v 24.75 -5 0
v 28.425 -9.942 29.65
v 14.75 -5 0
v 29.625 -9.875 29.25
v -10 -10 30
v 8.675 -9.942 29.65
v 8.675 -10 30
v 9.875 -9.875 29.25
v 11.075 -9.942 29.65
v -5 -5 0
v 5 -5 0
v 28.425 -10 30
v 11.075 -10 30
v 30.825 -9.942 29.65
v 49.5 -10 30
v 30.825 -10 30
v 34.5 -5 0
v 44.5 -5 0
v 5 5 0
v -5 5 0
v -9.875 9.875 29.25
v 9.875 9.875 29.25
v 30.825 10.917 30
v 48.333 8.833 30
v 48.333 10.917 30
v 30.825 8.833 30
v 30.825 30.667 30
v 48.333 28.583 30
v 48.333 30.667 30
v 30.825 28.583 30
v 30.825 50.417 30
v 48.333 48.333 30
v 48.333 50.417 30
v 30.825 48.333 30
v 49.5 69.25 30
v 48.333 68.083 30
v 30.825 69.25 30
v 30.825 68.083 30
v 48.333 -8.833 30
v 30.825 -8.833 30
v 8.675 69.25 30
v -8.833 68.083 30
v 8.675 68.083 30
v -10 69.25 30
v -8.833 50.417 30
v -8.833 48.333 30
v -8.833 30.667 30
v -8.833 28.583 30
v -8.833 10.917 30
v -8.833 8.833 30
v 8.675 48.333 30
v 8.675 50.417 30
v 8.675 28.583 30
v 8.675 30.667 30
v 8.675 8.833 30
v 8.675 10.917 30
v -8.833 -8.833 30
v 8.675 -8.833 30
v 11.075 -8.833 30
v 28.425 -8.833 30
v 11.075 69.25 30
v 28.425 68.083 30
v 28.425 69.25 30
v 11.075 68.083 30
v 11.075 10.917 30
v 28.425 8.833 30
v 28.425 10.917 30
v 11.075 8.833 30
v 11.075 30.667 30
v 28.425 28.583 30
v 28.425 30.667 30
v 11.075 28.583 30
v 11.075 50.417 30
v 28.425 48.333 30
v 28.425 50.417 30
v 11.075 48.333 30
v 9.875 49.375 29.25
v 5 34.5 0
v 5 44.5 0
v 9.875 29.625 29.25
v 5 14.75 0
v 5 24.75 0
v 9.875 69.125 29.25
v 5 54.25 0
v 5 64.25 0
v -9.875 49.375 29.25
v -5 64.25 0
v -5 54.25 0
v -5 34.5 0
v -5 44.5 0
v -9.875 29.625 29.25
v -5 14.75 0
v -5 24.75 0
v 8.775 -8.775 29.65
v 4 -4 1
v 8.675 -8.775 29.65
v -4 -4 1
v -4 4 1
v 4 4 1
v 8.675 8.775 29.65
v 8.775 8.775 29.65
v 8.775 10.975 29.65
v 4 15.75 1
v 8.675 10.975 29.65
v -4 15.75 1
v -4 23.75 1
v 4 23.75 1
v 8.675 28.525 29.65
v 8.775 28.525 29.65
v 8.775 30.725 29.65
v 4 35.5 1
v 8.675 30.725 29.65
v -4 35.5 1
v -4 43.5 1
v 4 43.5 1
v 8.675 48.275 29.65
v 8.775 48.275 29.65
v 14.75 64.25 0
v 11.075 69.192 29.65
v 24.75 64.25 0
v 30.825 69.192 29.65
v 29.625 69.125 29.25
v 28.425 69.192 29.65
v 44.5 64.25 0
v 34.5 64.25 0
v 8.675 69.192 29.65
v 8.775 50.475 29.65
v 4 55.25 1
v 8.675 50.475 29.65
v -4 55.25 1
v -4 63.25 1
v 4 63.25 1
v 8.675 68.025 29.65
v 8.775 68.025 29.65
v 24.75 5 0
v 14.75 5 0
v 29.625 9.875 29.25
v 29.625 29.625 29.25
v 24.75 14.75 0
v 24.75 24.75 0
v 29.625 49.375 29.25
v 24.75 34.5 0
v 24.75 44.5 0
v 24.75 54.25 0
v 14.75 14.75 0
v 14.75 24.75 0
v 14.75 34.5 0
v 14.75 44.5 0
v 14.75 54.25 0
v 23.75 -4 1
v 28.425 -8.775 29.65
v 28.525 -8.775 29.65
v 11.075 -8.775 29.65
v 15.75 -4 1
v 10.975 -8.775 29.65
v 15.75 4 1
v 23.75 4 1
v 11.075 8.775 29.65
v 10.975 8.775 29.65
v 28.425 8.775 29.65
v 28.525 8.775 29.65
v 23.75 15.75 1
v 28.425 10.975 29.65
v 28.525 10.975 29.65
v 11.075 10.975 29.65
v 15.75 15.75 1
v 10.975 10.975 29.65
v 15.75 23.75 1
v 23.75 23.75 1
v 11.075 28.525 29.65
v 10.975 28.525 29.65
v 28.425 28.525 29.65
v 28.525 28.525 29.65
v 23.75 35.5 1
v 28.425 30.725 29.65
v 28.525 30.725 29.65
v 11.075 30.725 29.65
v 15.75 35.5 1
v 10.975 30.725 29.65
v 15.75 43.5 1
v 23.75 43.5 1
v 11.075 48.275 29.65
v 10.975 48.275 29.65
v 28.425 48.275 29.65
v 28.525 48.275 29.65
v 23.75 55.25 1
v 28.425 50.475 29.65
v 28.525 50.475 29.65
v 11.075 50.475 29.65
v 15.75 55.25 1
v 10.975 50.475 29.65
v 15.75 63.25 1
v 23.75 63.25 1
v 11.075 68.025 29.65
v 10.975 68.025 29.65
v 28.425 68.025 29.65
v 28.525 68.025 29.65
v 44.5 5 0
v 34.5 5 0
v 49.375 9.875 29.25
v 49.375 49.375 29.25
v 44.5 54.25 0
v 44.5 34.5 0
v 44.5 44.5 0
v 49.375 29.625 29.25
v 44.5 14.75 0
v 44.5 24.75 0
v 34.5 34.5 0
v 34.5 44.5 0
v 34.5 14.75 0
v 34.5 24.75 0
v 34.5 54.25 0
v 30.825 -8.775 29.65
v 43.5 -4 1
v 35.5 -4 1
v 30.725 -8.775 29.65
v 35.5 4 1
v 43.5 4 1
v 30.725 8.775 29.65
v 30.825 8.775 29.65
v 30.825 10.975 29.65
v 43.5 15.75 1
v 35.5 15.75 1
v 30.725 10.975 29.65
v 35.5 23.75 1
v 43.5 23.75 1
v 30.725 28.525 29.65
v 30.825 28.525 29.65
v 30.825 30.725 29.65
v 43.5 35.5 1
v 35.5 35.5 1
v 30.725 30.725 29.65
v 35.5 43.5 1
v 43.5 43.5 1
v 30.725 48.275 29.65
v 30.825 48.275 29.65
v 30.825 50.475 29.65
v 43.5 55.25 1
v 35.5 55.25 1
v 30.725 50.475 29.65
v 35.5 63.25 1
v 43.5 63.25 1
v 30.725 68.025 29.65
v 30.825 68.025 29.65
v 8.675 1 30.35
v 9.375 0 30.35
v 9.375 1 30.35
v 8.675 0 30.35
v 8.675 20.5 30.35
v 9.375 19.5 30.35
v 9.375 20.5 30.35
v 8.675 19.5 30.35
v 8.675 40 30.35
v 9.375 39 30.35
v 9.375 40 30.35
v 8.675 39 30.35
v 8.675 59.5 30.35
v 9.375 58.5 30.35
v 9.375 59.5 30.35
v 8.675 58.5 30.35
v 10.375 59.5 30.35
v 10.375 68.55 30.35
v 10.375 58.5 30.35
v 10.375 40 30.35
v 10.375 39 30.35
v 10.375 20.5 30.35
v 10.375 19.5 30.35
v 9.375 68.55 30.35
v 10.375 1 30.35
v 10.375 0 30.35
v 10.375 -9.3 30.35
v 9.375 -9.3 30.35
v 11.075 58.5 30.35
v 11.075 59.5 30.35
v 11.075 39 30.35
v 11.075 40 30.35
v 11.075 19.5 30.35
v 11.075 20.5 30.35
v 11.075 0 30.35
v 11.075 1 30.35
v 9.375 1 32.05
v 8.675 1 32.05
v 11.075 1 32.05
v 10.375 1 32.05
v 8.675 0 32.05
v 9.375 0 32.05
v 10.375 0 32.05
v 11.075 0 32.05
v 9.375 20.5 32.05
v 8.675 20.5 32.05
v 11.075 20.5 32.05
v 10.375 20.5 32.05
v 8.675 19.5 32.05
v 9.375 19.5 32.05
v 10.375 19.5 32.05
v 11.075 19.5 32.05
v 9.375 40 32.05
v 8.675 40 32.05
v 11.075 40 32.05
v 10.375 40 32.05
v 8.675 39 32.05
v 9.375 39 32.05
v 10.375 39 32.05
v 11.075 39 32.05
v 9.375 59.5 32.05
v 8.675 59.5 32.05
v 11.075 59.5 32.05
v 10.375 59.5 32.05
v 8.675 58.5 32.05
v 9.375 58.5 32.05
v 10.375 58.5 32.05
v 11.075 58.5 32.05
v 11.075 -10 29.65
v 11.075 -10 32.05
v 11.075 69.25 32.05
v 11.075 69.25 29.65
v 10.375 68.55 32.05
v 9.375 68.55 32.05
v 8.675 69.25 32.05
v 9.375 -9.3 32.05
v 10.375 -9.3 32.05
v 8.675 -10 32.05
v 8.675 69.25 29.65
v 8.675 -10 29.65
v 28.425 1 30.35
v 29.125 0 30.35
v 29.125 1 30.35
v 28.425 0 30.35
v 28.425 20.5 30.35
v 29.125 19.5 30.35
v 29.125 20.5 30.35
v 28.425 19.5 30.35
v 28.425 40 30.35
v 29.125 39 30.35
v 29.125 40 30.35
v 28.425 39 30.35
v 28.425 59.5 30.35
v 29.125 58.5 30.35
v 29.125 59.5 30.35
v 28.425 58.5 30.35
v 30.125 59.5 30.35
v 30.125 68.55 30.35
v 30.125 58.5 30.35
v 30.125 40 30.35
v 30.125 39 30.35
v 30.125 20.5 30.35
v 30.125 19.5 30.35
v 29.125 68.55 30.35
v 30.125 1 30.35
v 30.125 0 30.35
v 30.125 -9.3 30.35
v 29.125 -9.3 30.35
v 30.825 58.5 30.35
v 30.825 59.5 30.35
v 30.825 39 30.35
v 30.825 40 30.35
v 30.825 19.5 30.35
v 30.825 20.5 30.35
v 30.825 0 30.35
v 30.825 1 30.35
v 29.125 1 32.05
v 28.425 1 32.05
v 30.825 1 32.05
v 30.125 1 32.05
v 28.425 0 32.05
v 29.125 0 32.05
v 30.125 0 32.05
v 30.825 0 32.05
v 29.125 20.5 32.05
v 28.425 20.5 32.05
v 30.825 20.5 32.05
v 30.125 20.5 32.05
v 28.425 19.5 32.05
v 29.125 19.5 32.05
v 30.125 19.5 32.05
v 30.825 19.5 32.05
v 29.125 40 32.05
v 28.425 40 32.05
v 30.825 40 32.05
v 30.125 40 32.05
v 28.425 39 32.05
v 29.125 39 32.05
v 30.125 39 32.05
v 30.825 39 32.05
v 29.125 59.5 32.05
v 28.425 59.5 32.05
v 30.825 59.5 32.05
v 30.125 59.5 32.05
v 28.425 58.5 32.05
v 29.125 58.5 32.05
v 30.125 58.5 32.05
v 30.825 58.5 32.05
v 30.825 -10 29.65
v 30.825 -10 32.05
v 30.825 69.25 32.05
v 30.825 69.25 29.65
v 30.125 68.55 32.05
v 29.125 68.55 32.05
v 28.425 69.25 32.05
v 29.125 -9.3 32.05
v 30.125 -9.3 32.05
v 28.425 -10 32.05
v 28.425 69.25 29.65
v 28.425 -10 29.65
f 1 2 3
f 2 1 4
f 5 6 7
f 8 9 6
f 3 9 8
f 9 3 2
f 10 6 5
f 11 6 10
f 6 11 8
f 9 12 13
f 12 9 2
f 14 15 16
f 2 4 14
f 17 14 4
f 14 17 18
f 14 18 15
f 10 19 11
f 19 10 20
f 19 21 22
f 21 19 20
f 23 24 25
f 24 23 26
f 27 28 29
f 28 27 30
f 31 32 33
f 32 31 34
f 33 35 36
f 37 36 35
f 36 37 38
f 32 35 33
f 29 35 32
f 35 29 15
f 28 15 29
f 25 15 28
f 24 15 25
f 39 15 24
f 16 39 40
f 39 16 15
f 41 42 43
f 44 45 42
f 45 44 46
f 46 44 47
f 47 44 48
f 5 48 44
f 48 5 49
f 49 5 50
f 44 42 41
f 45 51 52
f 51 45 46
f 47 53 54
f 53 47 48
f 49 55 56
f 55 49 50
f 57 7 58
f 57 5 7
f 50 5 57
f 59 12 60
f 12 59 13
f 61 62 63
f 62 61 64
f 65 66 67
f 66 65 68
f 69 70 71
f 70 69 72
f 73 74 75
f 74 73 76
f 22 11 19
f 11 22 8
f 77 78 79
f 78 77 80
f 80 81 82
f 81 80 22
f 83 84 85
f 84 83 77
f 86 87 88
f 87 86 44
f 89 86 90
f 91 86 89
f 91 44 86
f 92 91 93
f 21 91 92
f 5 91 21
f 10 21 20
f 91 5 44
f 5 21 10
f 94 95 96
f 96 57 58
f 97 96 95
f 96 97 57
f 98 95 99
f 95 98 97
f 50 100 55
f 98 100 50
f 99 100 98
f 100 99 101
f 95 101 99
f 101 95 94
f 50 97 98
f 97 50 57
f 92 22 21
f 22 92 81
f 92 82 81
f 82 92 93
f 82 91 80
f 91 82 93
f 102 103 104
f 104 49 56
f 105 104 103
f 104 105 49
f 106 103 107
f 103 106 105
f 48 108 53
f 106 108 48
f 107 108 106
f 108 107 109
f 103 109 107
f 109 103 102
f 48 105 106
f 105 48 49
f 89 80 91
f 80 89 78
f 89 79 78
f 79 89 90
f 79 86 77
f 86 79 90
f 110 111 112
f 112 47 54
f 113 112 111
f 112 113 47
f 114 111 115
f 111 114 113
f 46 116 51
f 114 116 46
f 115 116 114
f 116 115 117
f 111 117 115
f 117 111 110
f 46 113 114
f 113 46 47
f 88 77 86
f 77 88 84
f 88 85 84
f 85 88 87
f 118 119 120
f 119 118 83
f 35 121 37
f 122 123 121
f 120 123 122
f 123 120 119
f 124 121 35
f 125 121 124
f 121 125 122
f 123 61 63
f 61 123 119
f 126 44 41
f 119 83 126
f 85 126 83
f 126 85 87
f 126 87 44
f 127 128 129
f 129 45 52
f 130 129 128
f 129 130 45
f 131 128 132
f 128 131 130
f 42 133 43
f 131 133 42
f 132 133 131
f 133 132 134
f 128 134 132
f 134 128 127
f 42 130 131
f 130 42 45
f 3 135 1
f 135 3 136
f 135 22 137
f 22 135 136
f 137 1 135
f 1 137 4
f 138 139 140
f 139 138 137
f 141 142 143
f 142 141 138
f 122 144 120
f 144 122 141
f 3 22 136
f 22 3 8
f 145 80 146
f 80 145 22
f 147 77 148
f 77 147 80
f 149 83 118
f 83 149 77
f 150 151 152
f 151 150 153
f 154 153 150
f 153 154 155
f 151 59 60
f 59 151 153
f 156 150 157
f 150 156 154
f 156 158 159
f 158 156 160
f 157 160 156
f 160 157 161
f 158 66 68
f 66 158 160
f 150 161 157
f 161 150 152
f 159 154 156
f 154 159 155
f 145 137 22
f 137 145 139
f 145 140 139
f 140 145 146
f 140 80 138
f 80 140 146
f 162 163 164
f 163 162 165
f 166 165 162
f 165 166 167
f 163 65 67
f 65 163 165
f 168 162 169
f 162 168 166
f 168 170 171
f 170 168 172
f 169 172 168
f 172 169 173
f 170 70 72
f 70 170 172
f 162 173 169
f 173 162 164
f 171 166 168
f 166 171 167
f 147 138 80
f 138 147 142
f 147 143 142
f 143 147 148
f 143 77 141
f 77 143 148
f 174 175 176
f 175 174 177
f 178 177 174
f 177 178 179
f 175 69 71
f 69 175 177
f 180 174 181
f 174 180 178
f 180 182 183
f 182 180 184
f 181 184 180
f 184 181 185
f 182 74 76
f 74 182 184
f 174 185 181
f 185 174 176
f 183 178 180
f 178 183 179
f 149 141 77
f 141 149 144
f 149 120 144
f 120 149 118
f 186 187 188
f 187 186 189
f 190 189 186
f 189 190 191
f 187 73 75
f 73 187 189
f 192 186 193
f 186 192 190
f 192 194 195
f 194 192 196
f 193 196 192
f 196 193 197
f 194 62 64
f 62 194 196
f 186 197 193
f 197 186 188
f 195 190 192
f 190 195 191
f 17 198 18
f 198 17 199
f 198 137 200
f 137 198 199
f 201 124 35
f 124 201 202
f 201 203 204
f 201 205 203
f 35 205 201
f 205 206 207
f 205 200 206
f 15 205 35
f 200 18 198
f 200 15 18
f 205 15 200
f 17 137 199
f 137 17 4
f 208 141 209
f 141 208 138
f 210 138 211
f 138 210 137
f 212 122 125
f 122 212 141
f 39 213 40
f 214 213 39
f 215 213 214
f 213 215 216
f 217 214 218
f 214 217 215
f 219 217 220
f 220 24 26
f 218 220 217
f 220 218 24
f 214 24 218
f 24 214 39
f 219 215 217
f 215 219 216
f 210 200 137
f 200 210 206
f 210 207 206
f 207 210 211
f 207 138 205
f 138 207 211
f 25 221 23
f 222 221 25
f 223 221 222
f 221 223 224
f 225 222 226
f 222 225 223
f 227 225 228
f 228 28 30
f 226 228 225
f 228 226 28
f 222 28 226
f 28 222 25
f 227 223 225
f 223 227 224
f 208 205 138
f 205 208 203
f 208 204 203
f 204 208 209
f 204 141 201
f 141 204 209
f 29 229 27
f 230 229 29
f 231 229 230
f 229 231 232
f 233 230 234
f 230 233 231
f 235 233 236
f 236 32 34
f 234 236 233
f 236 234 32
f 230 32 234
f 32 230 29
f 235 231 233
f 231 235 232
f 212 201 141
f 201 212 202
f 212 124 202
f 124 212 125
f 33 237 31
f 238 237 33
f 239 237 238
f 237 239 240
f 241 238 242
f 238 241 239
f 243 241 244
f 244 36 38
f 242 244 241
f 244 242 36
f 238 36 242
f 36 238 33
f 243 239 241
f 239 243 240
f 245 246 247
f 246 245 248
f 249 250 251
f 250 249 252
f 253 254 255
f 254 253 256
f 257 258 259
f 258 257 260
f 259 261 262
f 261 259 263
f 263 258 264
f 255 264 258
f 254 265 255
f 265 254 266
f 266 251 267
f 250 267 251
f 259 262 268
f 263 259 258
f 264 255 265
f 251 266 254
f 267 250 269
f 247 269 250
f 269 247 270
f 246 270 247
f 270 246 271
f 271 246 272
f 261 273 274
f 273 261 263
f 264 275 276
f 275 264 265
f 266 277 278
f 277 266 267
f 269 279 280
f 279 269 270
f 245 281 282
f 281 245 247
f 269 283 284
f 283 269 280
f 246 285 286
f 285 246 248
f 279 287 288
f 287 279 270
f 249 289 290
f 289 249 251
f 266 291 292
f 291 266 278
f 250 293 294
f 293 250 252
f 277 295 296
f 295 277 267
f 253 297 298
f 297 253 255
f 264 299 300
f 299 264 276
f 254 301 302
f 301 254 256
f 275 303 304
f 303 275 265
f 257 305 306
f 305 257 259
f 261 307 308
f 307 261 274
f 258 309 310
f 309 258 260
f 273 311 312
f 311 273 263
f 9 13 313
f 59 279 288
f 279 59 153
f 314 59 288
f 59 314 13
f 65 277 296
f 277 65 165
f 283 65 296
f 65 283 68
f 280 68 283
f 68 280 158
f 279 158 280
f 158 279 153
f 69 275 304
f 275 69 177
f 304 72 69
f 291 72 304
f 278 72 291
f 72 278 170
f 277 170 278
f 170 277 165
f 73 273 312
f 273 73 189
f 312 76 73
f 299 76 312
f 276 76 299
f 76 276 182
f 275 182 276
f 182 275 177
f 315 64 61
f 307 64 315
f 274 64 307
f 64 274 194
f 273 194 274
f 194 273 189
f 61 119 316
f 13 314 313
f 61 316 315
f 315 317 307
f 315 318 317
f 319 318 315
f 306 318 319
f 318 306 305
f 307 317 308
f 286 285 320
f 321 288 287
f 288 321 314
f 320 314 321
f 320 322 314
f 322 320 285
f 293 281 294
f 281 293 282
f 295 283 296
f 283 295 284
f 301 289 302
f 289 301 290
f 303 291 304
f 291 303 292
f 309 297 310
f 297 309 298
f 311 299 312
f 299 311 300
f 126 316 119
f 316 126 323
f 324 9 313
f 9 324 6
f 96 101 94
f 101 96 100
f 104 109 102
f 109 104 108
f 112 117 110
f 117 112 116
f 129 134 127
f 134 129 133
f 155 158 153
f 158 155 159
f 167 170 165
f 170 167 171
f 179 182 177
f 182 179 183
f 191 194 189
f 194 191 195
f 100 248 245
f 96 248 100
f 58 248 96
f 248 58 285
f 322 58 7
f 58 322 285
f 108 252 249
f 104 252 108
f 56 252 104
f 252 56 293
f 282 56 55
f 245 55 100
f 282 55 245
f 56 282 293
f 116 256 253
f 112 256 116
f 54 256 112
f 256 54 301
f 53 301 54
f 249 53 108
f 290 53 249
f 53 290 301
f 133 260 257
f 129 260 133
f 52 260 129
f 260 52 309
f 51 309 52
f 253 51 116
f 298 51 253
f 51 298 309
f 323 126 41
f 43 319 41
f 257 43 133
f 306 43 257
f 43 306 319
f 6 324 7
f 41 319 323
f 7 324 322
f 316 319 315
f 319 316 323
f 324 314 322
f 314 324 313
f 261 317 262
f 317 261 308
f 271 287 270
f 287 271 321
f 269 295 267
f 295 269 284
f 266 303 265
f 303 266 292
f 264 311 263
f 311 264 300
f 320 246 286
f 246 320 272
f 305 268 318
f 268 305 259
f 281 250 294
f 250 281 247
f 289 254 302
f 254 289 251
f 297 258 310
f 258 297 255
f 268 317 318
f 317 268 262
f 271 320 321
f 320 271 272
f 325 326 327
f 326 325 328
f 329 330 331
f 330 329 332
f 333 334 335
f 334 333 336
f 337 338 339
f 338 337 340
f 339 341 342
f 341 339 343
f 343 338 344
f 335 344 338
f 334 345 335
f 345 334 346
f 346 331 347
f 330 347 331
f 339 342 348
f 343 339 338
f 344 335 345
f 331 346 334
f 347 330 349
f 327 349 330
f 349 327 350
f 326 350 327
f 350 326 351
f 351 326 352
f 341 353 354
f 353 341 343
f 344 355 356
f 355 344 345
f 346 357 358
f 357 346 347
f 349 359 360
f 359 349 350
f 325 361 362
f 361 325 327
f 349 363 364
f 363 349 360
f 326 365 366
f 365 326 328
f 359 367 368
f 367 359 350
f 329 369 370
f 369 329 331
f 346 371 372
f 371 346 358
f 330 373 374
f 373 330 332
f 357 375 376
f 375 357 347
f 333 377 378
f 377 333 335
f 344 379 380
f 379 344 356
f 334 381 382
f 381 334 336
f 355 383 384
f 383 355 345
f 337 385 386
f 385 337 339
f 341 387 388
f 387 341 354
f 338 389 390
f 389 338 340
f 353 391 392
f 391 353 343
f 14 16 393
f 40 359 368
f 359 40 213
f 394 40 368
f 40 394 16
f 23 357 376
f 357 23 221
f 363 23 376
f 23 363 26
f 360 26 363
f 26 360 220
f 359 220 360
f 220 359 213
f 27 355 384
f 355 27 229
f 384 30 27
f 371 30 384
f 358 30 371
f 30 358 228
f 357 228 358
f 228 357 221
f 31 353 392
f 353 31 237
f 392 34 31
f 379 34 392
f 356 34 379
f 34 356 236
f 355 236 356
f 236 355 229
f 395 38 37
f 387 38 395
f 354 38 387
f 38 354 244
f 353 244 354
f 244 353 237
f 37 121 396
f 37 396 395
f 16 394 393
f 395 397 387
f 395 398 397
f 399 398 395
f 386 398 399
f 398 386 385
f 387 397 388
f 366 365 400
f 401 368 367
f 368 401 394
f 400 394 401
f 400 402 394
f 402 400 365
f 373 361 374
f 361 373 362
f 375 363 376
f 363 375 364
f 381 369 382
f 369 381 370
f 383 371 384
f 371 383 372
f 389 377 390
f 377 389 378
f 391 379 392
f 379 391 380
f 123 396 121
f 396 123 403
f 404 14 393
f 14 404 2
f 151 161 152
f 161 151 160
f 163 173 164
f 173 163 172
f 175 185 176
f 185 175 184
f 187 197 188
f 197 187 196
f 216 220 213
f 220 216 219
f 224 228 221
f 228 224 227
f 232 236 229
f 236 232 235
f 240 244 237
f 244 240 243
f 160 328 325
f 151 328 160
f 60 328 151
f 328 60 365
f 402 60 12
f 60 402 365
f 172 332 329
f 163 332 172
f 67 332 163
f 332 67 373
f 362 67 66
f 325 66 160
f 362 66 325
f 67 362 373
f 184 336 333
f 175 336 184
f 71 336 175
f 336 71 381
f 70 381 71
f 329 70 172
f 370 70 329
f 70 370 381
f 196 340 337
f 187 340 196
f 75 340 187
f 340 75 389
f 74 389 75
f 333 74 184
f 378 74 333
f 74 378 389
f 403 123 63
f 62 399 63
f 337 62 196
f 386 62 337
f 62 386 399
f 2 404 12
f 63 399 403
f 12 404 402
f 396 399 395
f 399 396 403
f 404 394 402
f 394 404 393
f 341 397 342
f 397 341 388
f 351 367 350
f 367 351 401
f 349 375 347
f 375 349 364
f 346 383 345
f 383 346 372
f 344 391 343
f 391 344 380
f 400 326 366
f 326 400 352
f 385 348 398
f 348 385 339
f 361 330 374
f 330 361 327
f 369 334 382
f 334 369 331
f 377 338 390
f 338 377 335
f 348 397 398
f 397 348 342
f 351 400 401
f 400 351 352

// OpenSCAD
/* [General] */
Thickness = 1;
ModuleSideSizeTop=20;
ModuleSideSizeBottom=10;
ModuleHeight = 30;
NumberModulesX = 3;
NumberModulesY = 4;

/* [Water] */
ScapeHole = "false"; //[true, false]
ScapeHoleDiameter = 1.5;
IrrigationSystem = "true"; //[true, false]
IrrigationSystemSize = 2.4;
IrrigationSystemThickness = 0.7;

/* [HIDDEN] */
sqr2 = sqrt(2);
$fn=30;

vase();

module vase(){
    tkDiv = 4;
    stepX = ModuleSideSizeTop-Thickness/tkDiv;
    stepY = ModuleSideSizeTop-Thickness/tkDiv;
    for(x=[0:NumberModulesX-1])
        for(y=[0:NumberModulesY-1])
            translate([x*stepX,
                       y*stepY])
                modulo();
    if(IrrigationSystem == "true"){
        translate([Thickness/2/tkDiv,0,-IrrigationSystemThickness/2])
        for(x=[1:NumberModulesX-1])
            translate([x*stepX-IrrigationSystemSize/2-
                        ModuleSideSizeTop/2,
                       -ModuleSideSizeTop/2,ModuleHeight])
                difference(){
                    iySize = NumberModulesY*stepY+Thickness/tkDiv;
                    cube([IrrigationSystemSize,
                          iySize,
                          IrrigationSystemSize]);
                    translate([IrrigationSystemThickness,
                               IrrigationSystemThickness,
                               IrrigationSystemThickness])
                        cube([IrrigationSystemSize-IrrigationSystemThickness*2,
                              iySize-IrrigationSystemThickness*2,
                              IrrigationSystemSize]);
                    for(y=[0:NumberModulesY-1]){
                        translate([-IrrigationSystemSize/2,
                                  y*(ModuleSideSizeTop-Thickness/2)+ModuleSideSizeTop/2,
                                  IrrigationSystemThickness]) 
                            cube([IrrigationSystemSize*2,Thickness,IrrigationSystemSize*2]);
                    }
                }
    }
}
module modulo(){
    rotate(a=[0,0,45]) difference(){ 
        cylinder(d1=ModuleSideSizeBottom*sqr2,d2=ModuleSideSizeTop*sqr2,h=ModuleHeight,$fn=4);
        translate([0,0,Thickness]) 
            cylinder(d1=(ModuleSideSizeBottom-Thickness*2)*sqr2,
                     d2=(ModuleSideSizeTop-Thickness*2)*sqr2,h=ModuleHeight,$fn=4);
        if(ScapeHole == "true"){
            cylinder(d=ScapeHoleDiameter,h=Thickness*3,center=true);
        }
    }
}
